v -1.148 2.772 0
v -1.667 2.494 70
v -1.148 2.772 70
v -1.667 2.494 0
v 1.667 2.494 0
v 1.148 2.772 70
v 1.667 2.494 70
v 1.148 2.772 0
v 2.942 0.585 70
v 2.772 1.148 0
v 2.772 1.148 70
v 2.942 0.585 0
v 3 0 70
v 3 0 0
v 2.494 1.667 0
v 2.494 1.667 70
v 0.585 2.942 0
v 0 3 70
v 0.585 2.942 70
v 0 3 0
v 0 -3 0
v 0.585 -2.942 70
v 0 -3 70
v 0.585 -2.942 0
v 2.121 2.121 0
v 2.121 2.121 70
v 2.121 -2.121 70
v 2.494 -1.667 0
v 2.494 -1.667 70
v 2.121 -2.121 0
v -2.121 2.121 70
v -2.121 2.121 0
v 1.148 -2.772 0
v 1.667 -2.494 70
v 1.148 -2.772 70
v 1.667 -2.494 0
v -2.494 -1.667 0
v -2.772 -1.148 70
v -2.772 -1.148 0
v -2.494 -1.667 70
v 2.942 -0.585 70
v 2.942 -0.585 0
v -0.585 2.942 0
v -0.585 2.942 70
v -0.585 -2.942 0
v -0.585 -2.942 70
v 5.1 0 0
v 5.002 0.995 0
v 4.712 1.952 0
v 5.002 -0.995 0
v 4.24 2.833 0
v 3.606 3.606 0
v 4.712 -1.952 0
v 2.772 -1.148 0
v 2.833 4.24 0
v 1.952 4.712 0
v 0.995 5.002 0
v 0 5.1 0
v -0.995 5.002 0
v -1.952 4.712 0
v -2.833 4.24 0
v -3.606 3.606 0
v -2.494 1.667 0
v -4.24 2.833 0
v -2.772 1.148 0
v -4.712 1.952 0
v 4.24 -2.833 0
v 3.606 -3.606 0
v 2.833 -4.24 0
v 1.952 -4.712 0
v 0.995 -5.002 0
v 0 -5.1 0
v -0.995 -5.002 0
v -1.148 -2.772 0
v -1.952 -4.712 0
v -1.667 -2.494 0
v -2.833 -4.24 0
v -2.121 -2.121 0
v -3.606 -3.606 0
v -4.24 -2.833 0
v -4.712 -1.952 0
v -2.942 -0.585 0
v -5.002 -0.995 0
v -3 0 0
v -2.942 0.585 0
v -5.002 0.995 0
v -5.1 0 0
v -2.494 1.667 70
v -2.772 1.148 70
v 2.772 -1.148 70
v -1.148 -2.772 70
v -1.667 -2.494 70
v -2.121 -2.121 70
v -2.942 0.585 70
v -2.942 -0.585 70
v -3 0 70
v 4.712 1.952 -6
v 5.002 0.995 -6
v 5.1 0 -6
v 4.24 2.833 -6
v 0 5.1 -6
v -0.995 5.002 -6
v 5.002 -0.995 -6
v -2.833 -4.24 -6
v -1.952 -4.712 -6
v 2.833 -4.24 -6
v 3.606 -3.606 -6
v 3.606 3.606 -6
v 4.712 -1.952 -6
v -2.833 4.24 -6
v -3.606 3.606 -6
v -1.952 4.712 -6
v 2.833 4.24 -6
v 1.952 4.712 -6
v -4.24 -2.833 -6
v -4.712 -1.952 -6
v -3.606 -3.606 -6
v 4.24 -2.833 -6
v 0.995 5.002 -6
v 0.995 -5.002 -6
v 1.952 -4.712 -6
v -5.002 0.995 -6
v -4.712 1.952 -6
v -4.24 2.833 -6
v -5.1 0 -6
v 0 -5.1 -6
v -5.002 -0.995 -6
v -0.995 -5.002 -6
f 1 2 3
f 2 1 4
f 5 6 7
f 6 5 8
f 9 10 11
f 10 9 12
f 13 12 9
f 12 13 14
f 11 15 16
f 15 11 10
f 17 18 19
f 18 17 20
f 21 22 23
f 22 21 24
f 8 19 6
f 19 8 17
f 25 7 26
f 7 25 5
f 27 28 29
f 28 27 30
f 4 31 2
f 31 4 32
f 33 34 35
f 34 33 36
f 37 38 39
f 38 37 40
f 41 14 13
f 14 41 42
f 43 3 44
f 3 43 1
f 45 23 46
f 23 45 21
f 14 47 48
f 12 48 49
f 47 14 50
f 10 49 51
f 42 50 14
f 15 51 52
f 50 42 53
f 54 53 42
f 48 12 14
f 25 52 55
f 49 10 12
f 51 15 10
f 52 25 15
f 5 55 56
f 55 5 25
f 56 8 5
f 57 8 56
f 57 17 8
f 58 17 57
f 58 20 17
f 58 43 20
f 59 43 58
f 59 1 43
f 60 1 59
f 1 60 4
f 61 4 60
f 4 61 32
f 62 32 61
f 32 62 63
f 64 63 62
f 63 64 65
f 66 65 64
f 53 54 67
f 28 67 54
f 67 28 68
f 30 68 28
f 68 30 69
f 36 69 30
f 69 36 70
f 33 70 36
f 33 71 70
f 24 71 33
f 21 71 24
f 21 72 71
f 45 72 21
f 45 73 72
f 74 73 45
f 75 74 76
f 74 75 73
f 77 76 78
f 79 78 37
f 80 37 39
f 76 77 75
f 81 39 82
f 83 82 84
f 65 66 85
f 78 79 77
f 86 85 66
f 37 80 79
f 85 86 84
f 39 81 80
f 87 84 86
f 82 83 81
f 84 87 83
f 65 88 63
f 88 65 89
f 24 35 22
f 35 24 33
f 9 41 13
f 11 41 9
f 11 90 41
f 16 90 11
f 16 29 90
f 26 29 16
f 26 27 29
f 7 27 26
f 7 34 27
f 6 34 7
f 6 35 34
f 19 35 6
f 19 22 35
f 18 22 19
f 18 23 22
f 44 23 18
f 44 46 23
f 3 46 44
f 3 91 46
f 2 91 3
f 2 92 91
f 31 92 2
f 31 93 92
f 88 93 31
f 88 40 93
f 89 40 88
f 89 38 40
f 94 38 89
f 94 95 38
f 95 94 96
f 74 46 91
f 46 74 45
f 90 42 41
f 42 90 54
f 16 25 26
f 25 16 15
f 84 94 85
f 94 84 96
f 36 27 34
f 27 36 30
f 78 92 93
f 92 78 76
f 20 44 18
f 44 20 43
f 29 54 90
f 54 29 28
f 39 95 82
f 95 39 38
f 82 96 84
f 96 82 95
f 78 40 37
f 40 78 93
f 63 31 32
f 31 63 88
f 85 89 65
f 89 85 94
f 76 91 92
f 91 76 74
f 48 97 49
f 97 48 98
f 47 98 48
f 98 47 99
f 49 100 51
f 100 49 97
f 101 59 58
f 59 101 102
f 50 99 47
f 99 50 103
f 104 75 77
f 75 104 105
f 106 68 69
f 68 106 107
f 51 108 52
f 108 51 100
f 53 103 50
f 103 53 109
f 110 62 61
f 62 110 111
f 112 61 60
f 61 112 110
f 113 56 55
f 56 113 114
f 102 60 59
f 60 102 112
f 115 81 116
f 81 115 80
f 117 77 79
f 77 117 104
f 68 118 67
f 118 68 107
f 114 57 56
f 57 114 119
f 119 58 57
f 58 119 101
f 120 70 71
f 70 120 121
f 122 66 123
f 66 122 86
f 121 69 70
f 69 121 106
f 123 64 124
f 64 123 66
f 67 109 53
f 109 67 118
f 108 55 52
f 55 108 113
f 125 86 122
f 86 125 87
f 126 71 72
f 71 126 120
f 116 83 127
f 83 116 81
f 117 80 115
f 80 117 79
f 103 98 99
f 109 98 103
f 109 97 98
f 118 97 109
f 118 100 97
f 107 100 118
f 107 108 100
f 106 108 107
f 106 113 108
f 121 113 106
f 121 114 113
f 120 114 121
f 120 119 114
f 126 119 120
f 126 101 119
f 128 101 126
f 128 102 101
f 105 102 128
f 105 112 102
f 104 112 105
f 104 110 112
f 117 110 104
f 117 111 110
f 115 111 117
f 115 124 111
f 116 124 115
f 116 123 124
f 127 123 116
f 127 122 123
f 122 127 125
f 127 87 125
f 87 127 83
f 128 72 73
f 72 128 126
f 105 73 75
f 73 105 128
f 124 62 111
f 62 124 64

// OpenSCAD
// Purchased hardware envelope; no modeled threads, not print.
$fn=32;
union(){cylinder(d=6,h=70);translate([0,0,-6])cylinder(d=10.2,h=6);}
